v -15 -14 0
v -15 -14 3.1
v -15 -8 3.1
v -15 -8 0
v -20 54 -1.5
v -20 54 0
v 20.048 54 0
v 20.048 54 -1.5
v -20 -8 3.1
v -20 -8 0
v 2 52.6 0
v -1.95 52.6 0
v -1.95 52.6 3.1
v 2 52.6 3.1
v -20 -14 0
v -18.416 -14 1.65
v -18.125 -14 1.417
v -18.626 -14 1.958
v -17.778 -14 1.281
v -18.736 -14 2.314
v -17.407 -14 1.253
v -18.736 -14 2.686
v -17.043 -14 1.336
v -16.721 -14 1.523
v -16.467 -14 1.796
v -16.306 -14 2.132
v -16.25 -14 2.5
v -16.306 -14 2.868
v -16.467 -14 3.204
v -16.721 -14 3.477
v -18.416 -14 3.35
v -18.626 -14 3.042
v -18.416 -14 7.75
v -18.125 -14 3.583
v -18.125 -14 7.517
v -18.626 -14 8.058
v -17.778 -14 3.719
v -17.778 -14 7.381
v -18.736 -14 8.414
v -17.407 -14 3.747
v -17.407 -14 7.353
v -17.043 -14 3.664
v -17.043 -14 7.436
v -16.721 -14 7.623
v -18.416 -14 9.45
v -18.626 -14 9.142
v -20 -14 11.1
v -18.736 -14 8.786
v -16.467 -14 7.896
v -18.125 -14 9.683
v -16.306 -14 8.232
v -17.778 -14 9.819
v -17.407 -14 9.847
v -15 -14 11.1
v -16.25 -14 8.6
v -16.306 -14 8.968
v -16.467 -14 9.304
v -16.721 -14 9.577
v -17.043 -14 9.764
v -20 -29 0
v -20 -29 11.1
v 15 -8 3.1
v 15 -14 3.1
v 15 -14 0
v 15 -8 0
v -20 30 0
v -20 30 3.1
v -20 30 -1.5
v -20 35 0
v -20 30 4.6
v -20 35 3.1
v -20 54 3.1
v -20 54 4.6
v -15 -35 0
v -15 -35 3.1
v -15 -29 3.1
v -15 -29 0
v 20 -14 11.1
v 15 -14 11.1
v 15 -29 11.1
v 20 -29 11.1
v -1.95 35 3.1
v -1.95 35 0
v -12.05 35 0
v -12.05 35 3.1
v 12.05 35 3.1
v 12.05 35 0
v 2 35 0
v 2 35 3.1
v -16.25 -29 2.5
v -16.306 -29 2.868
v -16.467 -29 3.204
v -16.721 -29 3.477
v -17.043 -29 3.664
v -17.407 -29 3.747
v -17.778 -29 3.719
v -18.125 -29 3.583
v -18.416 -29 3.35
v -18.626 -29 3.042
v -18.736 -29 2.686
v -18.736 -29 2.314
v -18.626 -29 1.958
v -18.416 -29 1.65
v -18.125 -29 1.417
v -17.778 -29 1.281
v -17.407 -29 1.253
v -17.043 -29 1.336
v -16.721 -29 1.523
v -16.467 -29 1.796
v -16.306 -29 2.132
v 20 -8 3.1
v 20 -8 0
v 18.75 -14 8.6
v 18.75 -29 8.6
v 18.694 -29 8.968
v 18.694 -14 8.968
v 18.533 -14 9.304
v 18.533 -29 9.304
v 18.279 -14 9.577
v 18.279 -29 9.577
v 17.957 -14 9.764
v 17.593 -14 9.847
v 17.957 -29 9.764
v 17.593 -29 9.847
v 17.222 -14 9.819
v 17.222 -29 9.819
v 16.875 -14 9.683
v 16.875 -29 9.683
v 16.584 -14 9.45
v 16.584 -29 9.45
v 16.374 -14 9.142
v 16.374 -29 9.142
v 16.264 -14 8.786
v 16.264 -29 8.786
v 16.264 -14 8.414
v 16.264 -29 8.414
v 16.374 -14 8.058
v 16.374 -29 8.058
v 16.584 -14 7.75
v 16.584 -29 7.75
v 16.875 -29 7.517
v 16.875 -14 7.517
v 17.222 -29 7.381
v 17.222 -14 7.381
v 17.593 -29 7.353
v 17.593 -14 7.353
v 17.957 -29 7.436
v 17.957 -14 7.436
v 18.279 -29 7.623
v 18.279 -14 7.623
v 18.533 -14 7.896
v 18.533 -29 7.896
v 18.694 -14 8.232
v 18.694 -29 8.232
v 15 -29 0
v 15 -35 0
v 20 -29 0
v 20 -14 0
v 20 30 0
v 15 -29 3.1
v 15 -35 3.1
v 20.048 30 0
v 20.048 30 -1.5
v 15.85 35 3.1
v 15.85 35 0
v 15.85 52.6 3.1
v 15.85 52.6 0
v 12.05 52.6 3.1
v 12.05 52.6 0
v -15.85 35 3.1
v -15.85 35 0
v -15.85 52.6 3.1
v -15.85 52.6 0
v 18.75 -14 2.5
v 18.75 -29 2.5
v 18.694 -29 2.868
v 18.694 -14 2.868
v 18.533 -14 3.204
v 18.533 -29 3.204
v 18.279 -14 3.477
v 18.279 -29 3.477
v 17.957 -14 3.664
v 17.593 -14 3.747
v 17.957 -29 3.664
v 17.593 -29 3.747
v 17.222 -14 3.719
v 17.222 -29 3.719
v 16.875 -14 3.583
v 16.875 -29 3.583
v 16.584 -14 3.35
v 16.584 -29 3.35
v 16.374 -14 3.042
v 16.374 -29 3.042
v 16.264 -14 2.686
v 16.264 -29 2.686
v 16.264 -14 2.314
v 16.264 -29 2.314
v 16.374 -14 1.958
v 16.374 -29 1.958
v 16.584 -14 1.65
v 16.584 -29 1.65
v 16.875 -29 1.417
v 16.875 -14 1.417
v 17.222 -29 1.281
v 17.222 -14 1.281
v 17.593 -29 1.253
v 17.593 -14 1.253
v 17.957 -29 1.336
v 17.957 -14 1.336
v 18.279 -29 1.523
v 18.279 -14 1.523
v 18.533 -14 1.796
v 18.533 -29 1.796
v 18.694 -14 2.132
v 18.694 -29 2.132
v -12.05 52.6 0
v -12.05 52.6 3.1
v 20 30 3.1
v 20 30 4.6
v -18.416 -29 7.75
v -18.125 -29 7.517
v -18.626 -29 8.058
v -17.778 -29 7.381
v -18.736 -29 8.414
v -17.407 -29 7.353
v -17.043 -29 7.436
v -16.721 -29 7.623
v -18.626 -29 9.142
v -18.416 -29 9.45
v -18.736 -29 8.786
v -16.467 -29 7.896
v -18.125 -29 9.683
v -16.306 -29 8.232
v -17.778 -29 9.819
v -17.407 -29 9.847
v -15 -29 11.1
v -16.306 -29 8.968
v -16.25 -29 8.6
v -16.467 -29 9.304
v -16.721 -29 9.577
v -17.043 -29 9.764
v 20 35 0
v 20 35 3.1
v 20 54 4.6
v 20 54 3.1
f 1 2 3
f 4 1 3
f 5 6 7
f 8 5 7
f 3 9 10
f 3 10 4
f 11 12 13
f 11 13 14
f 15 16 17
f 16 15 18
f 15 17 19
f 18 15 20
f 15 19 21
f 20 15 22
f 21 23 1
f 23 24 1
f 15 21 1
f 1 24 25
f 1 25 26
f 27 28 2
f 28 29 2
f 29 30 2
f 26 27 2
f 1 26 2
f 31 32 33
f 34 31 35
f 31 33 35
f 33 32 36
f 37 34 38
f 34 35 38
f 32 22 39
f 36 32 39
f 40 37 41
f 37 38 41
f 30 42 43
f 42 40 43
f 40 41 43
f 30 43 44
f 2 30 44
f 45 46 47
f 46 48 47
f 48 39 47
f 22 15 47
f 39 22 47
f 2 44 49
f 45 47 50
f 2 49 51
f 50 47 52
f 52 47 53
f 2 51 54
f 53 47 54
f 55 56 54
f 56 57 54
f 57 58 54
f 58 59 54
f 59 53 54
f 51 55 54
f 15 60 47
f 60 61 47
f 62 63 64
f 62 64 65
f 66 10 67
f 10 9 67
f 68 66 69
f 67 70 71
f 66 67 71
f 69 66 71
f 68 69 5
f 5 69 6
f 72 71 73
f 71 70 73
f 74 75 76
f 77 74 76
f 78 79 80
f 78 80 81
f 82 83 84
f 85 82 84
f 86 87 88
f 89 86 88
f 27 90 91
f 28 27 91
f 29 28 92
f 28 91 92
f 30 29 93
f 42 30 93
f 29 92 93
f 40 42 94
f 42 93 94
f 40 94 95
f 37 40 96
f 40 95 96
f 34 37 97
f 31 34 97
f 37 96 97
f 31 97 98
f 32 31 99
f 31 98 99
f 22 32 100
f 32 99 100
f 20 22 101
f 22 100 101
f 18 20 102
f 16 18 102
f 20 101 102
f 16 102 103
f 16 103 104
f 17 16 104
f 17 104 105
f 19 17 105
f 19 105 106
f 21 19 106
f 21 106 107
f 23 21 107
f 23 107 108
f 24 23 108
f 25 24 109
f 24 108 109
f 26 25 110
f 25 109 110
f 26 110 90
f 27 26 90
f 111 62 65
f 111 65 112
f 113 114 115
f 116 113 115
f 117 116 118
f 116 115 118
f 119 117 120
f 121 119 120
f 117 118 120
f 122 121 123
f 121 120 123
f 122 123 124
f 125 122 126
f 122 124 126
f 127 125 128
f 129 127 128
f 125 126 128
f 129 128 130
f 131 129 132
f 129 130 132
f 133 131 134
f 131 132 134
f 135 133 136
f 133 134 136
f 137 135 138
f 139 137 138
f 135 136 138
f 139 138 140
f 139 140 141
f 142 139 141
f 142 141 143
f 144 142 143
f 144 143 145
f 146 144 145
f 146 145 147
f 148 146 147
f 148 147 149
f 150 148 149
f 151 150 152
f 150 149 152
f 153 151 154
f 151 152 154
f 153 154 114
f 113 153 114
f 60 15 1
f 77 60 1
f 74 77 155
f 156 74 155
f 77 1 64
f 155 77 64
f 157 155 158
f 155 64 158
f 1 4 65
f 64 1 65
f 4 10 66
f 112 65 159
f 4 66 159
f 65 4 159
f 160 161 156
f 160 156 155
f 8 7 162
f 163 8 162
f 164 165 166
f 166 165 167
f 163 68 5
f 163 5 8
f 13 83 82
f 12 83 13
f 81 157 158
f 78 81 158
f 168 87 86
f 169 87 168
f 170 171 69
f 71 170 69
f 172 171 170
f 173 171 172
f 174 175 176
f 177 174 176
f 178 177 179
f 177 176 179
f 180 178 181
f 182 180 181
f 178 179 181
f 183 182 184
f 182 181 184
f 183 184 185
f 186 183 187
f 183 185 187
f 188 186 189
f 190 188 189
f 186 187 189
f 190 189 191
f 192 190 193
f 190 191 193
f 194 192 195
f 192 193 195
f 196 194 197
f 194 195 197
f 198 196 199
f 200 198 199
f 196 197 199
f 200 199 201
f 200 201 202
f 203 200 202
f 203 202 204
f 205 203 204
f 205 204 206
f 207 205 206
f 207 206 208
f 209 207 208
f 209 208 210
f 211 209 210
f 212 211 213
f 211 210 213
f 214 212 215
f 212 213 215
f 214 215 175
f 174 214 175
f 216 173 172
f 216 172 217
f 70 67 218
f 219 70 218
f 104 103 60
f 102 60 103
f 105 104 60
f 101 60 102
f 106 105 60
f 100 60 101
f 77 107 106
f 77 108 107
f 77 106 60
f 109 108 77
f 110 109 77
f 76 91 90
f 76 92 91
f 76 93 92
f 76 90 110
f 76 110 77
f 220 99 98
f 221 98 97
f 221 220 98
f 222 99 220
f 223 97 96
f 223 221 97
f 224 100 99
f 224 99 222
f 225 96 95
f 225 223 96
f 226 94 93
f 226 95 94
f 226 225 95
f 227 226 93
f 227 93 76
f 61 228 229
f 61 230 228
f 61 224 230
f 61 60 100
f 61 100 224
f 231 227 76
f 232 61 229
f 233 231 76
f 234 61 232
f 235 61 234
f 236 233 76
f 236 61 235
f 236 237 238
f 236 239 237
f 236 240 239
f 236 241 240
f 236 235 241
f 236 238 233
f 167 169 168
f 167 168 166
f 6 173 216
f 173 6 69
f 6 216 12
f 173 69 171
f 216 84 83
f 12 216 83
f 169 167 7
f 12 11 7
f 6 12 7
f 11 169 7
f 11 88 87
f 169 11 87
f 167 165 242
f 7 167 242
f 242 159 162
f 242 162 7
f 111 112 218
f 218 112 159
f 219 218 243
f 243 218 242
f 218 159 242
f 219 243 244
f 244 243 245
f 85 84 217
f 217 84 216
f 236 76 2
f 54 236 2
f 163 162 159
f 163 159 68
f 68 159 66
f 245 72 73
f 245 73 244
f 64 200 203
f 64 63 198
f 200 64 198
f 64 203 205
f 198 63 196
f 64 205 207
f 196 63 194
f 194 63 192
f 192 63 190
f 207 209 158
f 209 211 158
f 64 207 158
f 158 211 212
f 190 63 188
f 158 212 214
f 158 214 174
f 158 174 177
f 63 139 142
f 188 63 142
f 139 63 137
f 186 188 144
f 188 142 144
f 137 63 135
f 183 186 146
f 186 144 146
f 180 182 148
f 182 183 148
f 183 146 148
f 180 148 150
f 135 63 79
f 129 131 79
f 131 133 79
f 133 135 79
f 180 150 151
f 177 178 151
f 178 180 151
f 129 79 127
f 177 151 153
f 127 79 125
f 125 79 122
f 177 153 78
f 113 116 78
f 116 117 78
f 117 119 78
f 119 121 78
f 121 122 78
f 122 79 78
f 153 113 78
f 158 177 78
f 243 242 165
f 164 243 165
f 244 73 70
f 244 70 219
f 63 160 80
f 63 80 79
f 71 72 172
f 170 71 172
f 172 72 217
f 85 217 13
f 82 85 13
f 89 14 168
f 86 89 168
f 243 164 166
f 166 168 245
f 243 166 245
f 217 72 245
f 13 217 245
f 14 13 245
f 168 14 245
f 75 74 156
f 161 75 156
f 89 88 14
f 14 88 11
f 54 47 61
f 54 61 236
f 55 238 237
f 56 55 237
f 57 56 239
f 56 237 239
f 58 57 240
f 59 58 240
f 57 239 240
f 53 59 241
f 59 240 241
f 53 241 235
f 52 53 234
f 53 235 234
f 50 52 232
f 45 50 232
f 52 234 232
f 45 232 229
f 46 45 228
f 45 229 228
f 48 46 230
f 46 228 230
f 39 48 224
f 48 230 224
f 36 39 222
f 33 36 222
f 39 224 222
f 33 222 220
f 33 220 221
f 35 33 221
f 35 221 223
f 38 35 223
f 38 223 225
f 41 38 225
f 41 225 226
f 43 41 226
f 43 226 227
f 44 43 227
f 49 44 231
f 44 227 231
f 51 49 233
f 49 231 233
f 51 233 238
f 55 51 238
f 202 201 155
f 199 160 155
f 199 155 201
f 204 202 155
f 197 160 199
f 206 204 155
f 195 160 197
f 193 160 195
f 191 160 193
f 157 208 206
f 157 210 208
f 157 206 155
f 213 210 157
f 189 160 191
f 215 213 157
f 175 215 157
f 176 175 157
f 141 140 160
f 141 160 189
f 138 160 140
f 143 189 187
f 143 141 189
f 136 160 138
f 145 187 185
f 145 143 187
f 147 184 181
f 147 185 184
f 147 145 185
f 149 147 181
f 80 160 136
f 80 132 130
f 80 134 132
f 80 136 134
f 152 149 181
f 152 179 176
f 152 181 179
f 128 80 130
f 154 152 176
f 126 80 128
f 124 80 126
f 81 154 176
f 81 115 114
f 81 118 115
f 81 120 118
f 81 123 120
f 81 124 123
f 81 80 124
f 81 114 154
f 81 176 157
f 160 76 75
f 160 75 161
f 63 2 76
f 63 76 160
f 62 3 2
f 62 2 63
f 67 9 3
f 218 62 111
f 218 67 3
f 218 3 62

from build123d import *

# Parameters (mm, degrees)
F0_W      = 3.95
F0_H      = 17.6
F0_W_2    = 3.8
F1_DEPTH  = 3.1
F2_W      = 40
F2_H      = 24
F3_DEPTH  = 1.5
F5_DEPTH  = 1.5
F6_W      = 5
F6_H      = 15
F7_DEPTH  = 8
F8_W      = 5
F8_H      = 6
F9_DEPTH  = 4.601
F10_R     = 1.25
F11_DEPTH = 15
F12_R     = 1.25
F13_DEPTH = 15


with BuildPart() as f1:
    # F0 (on Top) → F1 (new body)
    with BuildSketch(Plane.XY):
        with Locations((0.025, 43.8)):
            Rectangle(F0_W, F0_H)
        with Locations((-13.95, 43.8)):
            Rectangle(F0_W_2, F0_H)
        with Locations((13.95, 43.8)):
            Rectangle(F0_W_2, F0_H)
        Polygon((20, -35), (20, 35), (15.85, 35), (12.05, 35), (2, 35), (-1.95, 35), (-12.05, 35), (-15.85, 35), (-20, 35), (-20, -35), align=None)
    extrude(amount=F1_DEPTH)

    # F2 (on face) → F3 (join)
    with BuildSketch(Plane.XY.offset(3.1)):
        with Locations((0, 42)):
            Rectangle(F2_W, F2_H)
    extrude(amount=F3_DEPTH)

    # F4 (on face) → F5 (join)
    with BuildSketch(Plane(origin=(0, 0, 0), x_dir=(1, 0, 0), z_dir=(0, 0, -1))):
        Polygon((20.048024, -30), (20, -30), (20, -35), (15.85, -35), (15.85, -52.6), (12.05, -52.6), (12.05, -35), (2, -35), (2, -52.6), (-1.95, -52.6), (-1.95, -35), (-12.05, -35), (-12.05, -52.6), (-15.85, -52.6), (-15.85, -35), (-20, -35), (-20, -54), (20.048024, -54), align=None)
        Polygon((20, -30), (-20, -30), (-20, -35), (-15.85, -35), (-15.85, -52.6), (-12.05, -52.6), (-12.05, -35), (-1.95, -35), (-1.95, -52.6), (2, -52.6), (2, -35), (12.05, -35), (12.05, -52.6), (15.85, -52.6), (15.85, -35), (20, -35), align=None)
    extrude(amount=F5_DEPTH)

    # F6 (on face) → F7 (join)
    with BuildSketch(Plane.XY.offset(3.1)):
        with Locations((17.5, -21.5)):
            Rectangle(F6_W, F6_H)
        with Locations((-17.5, -21.5)):
            Rectangle(F6_W, F6_H)
    extrude(amount=F7_DEPTH)

    # F8 (on face) → F9 (cut, through all)
    with BuildSketch(Plane.XY.offset(3.1)):
        with Locations((17.5, -32)):
            Rectangle(F8_W, F8_H)
        with Locations((17.5, -11)):
            Rectangle(F8_W, F8_H)
        with Locations((-17.5, -11)):
            Rectangle(F8_W, F8_H)
        with Locations((-17.5, -32)):
            Rectangle(F8_W, F8_H)
    extrude(amount=-F9_DEPTH, mode=Mode.SUBTRACT)

    # F10 (on face) → F11 (cut, through all)
    with BuildSketch(Plane.XZ.offset(29)):
        with Locations((17.5, 8.6)):
            Circle(F10_R)
        with Locations((17.5, 2.5)):
            Circle(F10_R)
    extrude(amount=-F11_DEPTH, mode=Mode.SUBTRACT)

    # F12 (on face) → F13 (cut, through all)
    with BuildSketch(Plane.XZ.offset(29)):
        with Locations((-17.5, 8.6)):
            Circle(F12_R)
        with Locations((-17.5, 2.5)):
            Circle(F12_R)
    extrude(amount=-F13_DEPTH, mode=Mode.SUBTRACT)


solid = f1.part
